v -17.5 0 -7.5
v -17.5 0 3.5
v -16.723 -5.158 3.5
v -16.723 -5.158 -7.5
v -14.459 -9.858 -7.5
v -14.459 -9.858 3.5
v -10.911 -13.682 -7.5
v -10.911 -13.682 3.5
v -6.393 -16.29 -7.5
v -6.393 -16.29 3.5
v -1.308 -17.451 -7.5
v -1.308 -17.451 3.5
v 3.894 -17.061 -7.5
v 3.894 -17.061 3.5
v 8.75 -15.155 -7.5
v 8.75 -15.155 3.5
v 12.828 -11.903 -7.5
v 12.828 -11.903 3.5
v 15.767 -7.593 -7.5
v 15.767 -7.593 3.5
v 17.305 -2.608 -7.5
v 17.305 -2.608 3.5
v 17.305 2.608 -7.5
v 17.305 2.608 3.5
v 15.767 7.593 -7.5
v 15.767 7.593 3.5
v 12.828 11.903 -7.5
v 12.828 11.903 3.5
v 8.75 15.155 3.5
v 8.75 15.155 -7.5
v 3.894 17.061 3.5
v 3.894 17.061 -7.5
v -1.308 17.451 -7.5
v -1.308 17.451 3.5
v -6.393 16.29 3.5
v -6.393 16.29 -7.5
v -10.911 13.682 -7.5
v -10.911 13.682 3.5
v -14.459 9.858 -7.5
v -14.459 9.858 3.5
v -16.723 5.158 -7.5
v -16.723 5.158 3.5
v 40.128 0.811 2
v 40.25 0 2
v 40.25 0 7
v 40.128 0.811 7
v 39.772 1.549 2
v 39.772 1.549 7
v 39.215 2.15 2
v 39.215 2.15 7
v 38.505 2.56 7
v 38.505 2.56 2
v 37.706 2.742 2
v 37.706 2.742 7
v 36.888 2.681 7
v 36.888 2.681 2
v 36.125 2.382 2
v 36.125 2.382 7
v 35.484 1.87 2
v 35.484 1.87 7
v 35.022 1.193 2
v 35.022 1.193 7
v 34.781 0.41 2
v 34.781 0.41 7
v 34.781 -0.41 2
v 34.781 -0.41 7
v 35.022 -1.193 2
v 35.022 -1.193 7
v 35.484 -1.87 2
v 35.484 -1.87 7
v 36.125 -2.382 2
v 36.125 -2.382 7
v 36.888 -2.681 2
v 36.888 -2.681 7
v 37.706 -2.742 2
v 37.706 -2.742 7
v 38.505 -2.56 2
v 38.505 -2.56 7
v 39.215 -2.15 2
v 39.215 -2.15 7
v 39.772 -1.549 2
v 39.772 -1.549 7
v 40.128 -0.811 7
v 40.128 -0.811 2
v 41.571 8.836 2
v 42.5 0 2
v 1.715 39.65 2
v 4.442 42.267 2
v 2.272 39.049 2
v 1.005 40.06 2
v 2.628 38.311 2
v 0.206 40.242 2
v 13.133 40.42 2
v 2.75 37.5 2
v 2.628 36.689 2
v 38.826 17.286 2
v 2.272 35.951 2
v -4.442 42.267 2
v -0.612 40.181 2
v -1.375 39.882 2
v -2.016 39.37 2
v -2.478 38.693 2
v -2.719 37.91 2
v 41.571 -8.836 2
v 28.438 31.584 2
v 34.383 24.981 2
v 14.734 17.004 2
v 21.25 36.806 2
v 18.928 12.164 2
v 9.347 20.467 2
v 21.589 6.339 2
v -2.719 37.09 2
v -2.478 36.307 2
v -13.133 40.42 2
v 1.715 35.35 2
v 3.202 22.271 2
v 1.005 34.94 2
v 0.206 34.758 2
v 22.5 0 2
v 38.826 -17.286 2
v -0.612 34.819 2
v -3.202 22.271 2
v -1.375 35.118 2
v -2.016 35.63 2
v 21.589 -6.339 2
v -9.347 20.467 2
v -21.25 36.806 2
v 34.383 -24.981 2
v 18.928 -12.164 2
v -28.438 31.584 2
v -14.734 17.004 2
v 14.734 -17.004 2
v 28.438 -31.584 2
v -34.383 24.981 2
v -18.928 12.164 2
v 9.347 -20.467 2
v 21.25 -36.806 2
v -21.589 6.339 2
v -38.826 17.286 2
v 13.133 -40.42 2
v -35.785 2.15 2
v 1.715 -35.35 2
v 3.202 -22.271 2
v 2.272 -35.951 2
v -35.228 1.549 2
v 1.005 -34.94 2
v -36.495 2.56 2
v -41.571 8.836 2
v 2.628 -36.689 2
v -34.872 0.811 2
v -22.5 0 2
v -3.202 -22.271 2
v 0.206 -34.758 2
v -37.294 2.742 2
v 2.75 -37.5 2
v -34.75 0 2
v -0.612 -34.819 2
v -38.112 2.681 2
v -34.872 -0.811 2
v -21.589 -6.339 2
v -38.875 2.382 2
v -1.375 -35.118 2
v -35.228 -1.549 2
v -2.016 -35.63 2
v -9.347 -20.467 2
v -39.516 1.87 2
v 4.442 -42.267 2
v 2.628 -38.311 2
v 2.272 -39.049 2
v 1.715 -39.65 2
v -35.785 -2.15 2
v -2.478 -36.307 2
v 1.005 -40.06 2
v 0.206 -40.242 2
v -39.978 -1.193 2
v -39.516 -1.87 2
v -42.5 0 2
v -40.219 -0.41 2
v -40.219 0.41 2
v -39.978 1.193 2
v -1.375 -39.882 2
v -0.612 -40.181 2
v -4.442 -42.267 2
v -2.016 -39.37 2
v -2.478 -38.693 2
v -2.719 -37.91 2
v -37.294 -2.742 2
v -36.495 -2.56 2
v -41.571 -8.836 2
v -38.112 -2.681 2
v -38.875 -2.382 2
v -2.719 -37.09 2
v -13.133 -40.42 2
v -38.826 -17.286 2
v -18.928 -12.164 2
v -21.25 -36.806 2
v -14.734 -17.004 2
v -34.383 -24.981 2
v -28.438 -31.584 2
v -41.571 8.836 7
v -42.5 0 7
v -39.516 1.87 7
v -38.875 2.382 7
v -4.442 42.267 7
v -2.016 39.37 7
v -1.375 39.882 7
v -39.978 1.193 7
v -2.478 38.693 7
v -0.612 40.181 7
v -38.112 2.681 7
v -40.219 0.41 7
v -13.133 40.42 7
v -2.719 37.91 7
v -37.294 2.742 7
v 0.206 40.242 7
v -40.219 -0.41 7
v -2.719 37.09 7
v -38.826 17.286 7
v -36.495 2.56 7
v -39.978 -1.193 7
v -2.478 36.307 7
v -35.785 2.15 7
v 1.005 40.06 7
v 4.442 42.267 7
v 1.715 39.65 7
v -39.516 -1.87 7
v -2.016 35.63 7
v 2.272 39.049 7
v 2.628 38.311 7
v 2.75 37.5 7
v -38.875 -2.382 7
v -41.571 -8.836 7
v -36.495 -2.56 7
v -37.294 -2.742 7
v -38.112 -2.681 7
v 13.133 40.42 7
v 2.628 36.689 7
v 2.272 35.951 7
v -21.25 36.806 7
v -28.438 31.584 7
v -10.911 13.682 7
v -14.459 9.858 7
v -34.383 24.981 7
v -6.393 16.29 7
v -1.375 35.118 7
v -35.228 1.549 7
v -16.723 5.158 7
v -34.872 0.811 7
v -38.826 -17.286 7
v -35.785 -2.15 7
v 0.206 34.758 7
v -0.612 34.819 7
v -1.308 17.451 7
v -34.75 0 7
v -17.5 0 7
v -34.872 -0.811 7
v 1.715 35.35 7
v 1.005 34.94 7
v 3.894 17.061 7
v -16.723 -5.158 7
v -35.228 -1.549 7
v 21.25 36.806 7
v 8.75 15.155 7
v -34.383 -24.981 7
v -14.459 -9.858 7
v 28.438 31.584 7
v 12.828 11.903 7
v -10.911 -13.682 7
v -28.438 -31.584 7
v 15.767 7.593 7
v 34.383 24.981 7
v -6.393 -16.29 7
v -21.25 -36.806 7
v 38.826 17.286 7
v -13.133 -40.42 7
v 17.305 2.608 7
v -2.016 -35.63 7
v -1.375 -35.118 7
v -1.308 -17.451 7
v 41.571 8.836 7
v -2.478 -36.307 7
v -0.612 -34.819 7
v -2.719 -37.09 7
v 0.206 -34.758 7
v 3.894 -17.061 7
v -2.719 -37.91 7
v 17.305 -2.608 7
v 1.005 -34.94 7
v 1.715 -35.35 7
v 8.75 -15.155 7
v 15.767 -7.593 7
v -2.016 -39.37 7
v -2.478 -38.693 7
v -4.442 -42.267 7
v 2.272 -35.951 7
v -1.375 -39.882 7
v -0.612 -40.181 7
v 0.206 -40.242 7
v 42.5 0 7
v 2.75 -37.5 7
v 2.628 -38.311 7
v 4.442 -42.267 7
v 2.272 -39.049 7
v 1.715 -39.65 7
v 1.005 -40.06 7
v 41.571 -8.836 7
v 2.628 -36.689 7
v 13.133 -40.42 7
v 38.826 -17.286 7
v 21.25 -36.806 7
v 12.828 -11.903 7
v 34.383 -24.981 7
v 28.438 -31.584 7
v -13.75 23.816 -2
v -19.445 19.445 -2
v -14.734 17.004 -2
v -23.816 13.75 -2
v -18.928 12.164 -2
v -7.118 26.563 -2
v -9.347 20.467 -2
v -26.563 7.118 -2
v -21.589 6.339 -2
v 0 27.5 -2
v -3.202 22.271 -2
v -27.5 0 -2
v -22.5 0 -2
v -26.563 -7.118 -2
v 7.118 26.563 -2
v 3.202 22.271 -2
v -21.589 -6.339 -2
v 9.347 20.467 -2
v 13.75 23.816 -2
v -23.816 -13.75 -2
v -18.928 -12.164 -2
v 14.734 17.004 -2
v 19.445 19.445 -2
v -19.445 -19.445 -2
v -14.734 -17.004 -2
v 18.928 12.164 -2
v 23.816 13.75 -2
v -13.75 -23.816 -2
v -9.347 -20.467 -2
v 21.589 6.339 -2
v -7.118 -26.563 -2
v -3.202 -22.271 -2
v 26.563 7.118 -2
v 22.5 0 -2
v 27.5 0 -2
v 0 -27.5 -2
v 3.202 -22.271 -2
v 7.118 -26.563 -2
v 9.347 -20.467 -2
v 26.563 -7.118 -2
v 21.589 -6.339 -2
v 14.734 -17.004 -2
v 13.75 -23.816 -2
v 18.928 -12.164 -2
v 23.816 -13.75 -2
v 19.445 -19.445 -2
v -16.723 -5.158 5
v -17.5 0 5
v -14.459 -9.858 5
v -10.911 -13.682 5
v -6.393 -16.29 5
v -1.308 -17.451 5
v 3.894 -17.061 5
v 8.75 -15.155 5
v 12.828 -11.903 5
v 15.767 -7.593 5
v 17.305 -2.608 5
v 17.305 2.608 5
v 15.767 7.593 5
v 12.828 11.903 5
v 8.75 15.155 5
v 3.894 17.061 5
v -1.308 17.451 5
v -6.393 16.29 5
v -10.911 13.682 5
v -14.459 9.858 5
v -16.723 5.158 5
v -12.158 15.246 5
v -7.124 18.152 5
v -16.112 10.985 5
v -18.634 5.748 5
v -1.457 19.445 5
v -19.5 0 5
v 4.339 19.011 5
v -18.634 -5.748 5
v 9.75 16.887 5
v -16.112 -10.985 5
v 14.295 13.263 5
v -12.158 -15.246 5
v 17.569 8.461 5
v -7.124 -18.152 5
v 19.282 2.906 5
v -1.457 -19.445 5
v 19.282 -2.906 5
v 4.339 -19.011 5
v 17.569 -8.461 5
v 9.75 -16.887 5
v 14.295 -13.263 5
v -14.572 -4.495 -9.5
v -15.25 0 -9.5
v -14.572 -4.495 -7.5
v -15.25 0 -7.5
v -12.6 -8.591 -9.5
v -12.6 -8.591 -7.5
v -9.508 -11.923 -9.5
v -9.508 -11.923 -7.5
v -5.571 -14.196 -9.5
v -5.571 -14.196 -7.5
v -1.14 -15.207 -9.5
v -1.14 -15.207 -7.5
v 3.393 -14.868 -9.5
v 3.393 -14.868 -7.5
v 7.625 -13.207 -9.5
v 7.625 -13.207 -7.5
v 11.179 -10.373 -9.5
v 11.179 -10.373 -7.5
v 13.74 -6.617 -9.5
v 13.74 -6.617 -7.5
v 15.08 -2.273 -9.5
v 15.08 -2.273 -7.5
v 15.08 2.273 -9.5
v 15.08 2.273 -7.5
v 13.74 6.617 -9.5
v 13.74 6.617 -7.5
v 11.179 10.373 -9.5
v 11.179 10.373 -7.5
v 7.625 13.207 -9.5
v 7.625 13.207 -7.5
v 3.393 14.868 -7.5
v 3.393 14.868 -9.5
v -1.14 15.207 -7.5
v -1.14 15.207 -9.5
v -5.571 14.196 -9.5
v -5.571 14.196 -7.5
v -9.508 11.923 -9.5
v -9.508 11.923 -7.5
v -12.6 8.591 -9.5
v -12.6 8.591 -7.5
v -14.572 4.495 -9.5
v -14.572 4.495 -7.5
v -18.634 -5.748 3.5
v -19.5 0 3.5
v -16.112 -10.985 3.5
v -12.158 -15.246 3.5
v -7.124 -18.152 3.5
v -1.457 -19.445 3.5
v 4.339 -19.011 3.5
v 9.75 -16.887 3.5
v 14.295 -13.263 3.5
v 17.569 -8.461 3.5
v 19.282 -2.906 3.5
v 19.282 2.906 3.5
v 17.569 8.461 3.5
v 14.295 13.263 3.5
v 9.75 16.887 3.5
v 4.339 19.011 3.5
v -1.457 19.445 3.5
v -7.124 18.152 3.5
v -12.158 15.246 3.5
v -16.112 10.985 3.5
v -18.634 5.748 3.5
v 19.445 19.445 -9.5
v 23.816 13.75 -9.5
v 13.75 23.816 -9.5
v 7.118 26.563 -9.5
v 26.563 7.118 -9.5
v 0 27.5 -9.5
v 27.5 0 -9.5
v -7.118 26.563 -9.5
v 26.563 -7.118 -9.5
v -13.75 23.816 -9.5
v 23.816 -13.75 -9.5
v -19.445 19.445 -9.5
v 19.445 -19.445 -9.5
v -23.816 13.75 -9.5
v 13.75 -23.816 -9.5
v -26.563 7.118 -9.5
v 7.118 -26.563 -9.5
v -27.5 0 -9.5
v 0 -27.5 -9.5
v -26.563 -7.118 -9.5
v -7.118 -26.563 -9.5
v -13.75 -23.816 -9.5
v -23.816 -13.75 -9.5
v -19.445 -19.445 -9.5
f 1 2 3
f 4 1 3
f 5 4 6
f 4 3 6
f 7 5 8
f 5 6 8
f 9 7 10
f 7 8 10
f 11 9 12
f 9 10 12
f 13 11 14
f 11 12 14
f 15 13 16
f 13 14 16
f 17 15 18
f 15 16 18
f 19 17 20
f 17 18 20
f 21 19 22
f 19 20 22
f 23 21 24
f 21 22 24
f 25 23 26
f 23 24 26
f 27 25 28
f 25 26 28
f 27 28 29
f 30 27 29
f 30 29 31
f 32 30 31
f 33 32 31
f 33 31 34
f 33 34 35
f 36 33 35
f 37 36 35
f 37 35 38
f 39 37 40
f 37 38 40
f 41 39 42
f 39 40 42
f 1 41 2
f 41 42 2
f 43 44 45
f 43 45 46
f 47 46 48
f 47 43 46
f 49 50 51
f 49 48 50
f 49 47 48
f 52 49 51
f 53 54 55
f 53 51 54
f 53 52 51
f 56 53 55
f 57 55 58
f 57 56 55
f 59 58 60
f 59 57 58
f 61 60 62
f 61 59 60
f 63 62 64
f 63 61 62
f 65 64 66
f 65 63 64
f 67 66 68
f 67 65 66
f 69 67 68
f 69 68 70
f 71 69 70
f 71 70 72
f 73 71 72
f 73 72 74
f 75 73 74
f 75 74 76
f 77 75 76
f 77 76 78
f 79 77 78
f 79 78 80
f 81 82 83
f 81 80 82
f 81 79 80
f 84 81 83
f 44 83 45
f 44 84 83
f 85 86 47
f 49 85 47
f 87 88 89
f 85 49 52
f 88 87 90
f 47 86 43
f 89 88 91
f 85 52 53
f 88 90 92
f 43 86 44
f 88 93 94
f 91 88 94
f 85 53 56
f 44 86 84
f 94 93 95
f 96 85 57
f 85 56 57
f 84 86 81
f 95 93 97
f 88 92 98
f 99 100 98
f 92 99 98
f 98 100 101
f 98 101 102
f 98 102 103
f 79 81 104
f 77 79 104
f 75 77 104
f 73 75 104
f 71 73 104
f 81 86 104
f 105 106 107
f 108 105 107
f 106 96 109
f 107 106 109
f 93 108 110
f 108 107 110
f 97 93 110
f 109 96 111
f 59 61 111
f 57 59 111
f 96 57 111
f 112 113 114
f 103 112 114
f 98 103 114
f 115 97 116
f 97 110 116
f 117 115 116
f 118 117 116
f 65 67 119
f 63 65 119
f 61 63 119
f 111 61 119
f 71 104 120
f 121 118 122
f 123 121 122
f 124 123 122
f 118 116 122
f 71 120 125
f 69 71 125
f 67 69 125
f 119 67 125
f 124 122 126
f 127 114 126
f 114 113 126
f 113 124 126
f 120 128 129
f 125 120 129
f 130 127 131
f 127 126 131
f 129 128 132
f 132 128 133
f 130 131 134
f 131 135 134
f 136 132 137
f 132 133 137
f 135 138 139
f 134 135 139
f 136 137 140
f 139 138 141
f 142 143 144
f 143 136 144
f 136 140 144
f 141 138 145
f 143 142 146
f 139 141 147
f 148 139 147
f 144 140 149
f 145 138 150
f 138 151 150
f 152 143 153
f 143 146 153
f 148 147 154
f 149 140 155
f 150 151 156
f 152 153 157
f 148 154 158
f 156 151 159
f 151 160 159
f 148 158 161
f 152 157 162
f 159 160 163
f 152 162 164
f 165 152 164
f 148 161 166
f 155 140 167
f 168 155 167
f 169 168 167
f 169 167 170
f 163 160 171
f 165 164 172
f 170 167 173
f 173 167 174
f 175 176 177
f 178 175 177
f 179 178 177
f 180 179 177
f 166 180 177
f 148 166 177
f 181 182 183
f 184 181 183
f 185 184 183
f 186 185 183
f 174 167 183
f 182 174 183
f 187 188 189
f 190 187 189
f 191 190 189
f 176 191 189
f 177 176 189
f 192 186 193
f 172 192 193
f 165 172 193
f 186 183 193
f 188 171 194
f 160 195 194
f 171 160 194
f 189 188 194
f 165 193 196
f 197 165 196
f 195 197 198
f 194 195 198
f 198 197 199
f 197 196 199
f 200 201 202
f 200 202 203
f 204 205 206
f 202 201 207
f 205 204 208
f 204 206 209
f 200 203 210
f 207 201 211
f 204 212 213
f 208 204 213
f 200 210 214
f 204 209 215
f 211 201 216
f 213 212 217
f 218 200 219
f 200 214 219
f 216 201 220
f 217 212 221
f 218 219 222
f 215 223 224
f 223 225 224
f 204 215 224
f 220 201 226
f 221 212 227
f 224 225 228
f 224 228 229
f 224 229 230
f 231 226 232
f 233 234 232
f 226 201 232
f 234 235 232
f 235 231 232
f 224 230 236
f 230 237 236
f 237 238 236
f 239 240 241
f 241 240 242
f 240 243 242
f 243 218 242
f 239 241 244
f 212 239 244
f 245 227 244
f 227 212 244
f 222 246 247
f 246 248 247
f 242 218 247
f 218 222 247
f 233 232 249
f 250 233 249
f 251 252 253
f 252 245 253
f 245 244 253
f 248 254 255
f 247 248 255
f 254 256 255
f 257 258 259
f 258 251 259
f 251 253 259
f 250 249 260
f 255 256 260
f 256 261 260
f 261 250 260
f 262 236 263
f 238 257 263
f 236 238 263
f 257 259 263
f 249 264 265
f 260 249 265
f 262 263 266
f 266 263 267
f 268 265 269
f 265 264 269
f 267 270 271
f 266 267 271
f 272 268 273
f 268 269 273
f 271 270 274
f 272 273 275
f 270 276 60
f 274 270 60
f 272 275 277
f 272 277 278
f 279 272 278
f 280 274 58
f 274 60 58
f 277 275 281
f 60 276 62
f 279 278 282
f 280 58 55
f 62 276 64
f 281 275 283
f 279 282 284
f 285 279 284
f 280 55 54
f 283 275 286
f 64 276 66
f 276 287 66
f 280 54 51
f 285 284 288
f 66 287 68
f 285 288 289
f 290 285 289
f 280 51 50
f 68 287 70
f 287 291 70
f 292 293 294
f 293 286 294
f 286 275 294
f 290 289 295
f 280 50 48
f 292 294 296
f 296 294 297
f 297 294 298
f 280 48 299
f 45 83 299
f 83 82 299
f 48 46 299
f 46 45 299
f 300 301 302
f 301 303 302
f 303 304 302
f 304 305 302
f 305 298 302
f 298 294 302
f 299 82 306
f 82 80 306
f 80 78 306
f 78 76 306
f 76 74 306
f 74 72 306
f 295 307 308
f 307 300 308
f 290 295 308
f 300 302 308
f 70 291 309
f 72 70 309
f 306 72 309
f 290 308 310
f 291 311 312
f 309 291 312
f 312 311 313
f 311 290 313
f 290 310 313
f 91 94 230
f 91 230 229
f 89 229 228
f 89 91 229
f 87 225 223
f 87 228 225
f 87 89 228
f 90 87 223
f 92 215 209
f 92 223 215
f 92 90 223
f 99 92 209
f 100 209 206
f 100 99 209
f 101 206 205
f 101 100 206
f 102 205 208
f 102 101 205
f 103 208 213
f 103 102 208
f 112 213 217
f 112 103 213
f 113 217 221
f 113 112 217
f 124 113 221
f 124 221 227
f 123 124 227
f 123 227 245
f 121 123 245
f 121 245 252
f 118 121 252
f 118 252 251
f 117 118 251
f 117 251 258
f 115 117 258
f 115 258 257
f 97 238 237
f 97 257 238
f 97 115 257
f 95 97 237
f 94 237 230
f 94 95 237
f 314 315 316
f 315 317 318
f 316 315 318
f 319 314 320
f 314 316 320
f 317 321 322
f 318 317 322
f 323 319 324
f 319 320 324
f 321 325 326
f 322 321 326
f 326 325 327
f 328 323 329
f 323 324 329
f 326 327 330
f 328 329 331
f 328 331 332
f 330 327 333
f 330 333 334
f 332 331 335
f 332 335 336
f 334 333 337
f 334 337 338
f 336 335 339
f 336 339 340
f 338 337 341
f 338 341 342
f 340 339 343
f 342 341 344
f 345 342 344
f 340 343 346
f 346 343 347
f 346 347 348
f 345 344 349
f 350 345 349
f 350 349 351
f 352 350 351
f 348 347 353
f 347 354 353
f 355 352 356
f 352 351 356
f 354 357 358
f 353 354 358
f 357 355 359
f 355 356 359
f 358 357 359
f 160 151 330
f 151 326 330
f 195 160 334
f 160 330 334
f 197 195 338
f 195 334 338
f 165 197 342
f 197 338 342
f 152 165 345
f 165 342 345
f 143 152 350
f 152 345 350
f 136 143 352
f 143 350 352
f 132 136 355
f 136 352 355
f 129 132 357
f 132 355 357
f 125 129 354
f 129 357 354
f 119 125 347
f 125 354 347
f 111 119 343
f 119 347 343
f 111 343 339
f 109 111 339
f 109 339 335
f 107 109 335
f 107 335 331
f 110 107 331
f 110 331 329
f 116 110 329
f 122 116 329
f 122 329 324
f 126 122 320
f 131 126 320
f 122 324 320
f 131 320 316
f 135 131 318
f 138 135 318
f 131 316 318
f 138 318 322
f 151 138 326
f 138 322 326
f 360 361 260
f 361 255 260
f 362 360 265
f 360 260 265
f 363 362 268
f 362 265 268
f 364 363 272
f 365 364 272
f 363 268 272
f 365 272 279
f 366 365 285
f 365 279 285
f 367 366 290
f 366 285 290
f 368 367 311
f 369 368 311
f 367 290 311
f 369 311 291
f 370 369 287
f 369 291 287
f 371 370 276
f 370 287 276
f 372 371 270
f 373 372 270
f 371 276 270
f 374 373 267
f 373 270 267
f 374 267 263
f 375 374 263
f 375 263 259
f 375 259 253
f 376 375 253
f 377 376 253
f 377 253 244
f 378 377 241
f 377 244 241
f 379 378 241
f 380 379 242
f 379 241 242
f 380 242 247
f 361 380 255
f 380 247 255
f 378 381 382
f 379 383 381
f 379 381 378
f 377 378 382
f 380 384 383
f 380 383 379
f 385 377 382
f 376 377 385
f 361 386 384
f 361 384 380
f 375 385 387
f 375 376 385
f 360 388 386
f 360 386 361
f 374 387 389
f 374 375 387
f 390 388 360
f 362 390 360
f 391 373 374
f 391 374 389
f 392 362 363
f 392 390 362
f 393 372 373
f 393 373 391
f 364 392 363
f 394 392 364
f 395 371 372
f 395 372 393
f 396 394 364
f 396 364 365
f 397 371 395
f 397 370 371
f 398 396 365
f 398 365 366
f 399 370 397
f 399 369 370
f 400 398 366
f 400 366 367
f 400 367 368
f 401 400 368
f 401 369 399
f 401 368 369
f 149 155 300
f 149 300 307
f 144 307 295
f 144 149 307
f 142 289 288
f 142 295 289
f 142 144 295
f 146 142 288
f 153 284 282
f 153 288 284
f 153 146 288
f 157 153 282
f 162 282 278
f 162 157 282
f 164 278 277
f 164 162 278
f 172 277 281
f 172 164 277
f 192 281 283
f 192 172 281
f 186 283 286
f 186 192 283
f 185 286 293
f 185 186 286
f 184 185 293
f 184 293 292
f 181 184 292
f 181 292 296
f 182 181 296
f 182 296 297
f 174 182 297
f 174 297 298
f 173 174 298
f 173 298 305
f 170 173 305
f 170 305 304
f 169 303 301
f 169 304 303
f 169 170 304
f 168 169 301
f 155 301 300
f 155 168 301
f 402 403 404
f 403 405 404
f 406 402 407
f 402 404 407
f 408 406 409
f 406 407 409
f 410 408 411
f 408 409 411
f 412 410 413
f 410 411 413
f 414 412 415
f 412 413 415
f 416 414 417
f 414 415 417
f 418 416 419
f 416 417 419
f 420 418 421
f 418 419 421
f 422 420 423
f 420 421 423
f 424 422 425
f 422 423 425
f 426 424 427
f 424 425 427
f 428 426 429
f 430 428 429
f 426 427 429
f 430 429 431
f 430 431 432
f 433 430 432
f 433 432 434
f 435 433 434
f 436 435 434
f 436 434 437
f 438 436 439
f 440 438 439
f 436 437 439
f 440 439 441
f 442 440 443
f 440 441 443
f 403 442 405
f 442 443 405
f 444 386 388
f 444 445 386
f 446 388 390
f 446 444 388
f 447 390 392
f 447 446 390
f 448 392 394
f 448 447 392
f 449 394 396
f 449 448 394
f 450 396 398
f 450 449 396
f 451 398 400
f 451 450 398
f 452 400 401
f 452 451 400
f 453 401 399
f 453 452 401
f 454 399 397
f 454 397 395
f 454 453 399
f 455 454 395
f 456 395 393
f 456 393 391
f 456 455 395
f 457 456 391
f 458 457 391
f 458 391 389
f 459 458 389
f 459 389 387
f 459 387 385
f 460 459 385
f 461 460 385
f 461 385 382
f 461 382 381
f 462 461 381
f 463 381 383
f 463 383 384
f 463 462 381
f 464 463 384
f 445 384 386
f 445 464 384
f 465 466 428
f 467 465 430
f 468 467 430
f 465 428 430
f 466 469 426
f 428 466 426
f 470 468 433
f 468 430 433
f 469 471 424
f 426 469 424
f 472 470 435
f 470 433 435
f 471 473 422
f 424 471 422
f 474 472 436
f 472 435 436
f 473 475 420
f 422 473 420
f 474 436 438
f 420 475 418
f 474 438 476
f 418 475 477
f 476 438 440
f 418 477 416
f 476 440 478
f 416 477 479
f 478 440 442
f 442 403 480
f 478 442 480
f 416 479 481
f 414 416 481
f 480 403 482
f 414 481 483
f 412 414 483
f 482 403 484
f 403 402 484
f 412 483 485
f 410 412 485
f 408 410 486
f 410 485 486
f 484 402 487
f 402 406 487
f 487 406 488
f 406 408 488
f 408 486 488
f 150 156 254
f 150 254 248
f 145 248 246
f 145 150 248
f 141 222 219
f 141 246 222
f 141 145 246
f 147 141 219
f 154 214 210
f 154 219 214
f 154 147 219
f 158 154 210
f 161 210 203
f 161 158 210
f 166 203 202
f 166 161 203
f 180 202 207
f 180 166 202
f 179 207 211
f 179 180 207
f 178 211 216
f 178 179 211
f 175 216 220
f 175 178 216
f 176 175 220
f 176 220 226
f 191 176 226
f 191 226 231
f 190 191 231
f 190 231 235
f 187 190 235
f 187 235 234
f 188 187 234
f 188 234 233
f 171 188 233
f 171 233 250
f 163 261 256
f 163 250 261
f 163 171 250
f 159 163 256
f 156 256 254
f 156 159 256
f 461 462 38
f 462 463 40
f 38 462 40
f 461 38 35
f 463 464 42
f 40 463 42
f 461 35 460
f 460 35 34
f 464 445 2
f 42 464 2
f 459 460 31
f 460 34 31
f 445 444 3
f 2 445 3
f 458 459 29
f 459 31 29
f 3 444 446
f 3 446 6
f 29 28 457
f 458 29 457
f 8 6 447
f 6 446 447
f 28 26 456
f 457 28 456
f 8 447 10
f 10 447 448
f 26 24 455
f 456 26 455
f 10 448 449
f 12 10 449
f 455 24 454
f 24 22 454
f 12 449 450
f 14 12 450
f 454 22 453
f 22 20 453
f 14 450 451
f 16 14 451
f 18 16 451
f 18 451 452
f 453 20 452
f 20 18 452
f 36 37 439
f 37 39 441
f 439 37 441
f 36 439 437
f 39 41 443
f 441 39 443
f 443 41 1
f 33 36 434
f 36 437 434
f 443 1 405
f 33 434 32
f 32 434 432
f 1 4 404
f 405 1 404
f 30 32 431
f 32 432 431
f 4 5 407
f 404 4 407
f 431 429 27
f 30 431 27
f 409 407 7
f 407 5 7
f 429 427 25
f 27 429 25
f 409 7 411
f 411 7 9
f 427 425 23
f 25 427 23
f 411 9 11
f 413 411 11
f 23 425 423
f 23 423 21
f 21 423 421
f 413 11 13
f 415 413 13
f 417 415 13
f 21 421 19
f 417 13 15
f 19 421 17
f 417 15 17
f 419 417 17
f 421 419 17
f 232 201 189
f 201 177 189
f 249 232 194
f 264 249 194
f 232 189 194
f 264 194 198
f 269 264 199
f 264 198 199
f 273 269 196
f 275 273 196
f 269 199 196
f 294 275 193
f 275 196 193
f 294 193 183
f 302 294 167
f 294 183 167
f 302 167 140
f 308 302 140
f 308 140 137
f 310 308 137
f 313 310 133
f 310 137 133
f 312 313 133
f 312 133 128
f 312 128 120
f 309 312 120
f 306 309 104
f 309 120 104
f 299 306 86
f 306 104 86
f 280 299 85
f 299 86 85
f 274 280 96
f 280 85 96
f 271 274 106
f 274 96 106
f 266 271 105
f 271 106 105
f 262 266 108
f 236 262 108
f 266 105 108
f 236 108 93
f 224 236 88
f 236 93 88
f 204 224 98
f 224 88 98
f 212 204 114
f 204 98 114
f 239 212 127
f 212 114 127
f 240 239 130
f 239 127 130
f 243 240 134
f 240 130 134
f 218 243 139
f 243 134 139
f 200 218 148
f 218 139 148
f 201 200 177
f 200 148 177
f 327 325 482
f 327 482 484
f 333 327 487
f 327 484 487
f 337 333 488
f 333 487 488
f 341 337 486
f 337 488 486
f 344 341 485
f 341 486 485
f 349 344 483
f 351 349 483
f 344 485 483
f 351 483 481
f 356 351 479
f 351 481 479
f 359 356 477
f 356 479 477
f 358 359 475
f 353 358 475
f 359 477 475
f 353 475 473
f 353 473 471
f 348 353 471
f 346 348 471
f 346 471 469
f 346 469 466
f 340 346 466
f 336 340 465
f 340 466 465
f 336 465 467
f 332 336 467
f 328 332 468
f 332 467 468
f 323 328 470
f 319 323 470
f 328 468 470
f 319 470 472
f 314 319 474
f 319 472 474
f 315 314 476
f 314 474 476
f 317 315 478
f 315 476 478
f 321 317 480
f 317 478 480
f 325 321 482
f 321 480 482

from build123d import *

# Parameters (mm, degrees)
SKETCH3_R          = 2.75
CUT_EXTRUDE2_DEPTH = 61.850225965
SKETCH4_W          = 19.5
SKETCH4_H          = 1.5


with BuildPart() as part:
    # Sketch2 → Revolve1 (revolve)
    with BuildSketch(Plane(origin=(0, 0, 0), x_dir=(1, 0, 0), z_dir=(0, 1, 0)), mode=Mode.PRIVATE) as revolve1_sk:
        Polygon((17.5, -7), (42.5, -7), (42.5, -2), (22.5, -2), (22.5, 2), (27.5, 2), (27.5, 9.5), (15.25, 9.5), (15.25, 7.5), (17.5, 7.5), align=None)
    revolve(revolve1_sk.sketch.rotate(Axis((0, 0, -30.507012698), (0, 0, 1)), 180), axis=Axis((0, 0, -30.507012698), (0, 0, 1)))

    # Sketch3 → Cut-Extrude2 (cut, through all)
    with BuildSketch(Plane.XY):
        with Locations((0, 37.5)):
            Circle(SKETCH3_R)
        with Locations((37.5, 0)):
            Circle(SKETCH3_R)
        with Locations((0, -37.5)):
            Circle(SKETCH3_R)
        with Locations((-37.5, 0)):
            Circle(SKETCH3_R)
    extrude(amount=CUT_EXTRUDE2_DEPTH, mode=Mode.SUBTRACT)

    # Sketch4 → Cut-Revolve1 (revolve, cut)
    with BuildSketch(Plane(origin=(0, 0, 0), x_dir=(1, 0, 0), z_dir=(0, 1, 0)), mode=Mode.PRIVATE) as cut_revolve1_sk:
        with Locations((9.75, -4.25)):
            Rectangle(SKETCH4_W, SKETCH4_H)
    revolve(cut_revolve1_sk.sketch.rotate(Axis((0, 0, -30.507012698), (0, 0, 1)), 180), axis=Axis((0, 0, -30.507012698), (0, 0, 1)), mode=Mode.SUBTRACT)


solid = part.part
